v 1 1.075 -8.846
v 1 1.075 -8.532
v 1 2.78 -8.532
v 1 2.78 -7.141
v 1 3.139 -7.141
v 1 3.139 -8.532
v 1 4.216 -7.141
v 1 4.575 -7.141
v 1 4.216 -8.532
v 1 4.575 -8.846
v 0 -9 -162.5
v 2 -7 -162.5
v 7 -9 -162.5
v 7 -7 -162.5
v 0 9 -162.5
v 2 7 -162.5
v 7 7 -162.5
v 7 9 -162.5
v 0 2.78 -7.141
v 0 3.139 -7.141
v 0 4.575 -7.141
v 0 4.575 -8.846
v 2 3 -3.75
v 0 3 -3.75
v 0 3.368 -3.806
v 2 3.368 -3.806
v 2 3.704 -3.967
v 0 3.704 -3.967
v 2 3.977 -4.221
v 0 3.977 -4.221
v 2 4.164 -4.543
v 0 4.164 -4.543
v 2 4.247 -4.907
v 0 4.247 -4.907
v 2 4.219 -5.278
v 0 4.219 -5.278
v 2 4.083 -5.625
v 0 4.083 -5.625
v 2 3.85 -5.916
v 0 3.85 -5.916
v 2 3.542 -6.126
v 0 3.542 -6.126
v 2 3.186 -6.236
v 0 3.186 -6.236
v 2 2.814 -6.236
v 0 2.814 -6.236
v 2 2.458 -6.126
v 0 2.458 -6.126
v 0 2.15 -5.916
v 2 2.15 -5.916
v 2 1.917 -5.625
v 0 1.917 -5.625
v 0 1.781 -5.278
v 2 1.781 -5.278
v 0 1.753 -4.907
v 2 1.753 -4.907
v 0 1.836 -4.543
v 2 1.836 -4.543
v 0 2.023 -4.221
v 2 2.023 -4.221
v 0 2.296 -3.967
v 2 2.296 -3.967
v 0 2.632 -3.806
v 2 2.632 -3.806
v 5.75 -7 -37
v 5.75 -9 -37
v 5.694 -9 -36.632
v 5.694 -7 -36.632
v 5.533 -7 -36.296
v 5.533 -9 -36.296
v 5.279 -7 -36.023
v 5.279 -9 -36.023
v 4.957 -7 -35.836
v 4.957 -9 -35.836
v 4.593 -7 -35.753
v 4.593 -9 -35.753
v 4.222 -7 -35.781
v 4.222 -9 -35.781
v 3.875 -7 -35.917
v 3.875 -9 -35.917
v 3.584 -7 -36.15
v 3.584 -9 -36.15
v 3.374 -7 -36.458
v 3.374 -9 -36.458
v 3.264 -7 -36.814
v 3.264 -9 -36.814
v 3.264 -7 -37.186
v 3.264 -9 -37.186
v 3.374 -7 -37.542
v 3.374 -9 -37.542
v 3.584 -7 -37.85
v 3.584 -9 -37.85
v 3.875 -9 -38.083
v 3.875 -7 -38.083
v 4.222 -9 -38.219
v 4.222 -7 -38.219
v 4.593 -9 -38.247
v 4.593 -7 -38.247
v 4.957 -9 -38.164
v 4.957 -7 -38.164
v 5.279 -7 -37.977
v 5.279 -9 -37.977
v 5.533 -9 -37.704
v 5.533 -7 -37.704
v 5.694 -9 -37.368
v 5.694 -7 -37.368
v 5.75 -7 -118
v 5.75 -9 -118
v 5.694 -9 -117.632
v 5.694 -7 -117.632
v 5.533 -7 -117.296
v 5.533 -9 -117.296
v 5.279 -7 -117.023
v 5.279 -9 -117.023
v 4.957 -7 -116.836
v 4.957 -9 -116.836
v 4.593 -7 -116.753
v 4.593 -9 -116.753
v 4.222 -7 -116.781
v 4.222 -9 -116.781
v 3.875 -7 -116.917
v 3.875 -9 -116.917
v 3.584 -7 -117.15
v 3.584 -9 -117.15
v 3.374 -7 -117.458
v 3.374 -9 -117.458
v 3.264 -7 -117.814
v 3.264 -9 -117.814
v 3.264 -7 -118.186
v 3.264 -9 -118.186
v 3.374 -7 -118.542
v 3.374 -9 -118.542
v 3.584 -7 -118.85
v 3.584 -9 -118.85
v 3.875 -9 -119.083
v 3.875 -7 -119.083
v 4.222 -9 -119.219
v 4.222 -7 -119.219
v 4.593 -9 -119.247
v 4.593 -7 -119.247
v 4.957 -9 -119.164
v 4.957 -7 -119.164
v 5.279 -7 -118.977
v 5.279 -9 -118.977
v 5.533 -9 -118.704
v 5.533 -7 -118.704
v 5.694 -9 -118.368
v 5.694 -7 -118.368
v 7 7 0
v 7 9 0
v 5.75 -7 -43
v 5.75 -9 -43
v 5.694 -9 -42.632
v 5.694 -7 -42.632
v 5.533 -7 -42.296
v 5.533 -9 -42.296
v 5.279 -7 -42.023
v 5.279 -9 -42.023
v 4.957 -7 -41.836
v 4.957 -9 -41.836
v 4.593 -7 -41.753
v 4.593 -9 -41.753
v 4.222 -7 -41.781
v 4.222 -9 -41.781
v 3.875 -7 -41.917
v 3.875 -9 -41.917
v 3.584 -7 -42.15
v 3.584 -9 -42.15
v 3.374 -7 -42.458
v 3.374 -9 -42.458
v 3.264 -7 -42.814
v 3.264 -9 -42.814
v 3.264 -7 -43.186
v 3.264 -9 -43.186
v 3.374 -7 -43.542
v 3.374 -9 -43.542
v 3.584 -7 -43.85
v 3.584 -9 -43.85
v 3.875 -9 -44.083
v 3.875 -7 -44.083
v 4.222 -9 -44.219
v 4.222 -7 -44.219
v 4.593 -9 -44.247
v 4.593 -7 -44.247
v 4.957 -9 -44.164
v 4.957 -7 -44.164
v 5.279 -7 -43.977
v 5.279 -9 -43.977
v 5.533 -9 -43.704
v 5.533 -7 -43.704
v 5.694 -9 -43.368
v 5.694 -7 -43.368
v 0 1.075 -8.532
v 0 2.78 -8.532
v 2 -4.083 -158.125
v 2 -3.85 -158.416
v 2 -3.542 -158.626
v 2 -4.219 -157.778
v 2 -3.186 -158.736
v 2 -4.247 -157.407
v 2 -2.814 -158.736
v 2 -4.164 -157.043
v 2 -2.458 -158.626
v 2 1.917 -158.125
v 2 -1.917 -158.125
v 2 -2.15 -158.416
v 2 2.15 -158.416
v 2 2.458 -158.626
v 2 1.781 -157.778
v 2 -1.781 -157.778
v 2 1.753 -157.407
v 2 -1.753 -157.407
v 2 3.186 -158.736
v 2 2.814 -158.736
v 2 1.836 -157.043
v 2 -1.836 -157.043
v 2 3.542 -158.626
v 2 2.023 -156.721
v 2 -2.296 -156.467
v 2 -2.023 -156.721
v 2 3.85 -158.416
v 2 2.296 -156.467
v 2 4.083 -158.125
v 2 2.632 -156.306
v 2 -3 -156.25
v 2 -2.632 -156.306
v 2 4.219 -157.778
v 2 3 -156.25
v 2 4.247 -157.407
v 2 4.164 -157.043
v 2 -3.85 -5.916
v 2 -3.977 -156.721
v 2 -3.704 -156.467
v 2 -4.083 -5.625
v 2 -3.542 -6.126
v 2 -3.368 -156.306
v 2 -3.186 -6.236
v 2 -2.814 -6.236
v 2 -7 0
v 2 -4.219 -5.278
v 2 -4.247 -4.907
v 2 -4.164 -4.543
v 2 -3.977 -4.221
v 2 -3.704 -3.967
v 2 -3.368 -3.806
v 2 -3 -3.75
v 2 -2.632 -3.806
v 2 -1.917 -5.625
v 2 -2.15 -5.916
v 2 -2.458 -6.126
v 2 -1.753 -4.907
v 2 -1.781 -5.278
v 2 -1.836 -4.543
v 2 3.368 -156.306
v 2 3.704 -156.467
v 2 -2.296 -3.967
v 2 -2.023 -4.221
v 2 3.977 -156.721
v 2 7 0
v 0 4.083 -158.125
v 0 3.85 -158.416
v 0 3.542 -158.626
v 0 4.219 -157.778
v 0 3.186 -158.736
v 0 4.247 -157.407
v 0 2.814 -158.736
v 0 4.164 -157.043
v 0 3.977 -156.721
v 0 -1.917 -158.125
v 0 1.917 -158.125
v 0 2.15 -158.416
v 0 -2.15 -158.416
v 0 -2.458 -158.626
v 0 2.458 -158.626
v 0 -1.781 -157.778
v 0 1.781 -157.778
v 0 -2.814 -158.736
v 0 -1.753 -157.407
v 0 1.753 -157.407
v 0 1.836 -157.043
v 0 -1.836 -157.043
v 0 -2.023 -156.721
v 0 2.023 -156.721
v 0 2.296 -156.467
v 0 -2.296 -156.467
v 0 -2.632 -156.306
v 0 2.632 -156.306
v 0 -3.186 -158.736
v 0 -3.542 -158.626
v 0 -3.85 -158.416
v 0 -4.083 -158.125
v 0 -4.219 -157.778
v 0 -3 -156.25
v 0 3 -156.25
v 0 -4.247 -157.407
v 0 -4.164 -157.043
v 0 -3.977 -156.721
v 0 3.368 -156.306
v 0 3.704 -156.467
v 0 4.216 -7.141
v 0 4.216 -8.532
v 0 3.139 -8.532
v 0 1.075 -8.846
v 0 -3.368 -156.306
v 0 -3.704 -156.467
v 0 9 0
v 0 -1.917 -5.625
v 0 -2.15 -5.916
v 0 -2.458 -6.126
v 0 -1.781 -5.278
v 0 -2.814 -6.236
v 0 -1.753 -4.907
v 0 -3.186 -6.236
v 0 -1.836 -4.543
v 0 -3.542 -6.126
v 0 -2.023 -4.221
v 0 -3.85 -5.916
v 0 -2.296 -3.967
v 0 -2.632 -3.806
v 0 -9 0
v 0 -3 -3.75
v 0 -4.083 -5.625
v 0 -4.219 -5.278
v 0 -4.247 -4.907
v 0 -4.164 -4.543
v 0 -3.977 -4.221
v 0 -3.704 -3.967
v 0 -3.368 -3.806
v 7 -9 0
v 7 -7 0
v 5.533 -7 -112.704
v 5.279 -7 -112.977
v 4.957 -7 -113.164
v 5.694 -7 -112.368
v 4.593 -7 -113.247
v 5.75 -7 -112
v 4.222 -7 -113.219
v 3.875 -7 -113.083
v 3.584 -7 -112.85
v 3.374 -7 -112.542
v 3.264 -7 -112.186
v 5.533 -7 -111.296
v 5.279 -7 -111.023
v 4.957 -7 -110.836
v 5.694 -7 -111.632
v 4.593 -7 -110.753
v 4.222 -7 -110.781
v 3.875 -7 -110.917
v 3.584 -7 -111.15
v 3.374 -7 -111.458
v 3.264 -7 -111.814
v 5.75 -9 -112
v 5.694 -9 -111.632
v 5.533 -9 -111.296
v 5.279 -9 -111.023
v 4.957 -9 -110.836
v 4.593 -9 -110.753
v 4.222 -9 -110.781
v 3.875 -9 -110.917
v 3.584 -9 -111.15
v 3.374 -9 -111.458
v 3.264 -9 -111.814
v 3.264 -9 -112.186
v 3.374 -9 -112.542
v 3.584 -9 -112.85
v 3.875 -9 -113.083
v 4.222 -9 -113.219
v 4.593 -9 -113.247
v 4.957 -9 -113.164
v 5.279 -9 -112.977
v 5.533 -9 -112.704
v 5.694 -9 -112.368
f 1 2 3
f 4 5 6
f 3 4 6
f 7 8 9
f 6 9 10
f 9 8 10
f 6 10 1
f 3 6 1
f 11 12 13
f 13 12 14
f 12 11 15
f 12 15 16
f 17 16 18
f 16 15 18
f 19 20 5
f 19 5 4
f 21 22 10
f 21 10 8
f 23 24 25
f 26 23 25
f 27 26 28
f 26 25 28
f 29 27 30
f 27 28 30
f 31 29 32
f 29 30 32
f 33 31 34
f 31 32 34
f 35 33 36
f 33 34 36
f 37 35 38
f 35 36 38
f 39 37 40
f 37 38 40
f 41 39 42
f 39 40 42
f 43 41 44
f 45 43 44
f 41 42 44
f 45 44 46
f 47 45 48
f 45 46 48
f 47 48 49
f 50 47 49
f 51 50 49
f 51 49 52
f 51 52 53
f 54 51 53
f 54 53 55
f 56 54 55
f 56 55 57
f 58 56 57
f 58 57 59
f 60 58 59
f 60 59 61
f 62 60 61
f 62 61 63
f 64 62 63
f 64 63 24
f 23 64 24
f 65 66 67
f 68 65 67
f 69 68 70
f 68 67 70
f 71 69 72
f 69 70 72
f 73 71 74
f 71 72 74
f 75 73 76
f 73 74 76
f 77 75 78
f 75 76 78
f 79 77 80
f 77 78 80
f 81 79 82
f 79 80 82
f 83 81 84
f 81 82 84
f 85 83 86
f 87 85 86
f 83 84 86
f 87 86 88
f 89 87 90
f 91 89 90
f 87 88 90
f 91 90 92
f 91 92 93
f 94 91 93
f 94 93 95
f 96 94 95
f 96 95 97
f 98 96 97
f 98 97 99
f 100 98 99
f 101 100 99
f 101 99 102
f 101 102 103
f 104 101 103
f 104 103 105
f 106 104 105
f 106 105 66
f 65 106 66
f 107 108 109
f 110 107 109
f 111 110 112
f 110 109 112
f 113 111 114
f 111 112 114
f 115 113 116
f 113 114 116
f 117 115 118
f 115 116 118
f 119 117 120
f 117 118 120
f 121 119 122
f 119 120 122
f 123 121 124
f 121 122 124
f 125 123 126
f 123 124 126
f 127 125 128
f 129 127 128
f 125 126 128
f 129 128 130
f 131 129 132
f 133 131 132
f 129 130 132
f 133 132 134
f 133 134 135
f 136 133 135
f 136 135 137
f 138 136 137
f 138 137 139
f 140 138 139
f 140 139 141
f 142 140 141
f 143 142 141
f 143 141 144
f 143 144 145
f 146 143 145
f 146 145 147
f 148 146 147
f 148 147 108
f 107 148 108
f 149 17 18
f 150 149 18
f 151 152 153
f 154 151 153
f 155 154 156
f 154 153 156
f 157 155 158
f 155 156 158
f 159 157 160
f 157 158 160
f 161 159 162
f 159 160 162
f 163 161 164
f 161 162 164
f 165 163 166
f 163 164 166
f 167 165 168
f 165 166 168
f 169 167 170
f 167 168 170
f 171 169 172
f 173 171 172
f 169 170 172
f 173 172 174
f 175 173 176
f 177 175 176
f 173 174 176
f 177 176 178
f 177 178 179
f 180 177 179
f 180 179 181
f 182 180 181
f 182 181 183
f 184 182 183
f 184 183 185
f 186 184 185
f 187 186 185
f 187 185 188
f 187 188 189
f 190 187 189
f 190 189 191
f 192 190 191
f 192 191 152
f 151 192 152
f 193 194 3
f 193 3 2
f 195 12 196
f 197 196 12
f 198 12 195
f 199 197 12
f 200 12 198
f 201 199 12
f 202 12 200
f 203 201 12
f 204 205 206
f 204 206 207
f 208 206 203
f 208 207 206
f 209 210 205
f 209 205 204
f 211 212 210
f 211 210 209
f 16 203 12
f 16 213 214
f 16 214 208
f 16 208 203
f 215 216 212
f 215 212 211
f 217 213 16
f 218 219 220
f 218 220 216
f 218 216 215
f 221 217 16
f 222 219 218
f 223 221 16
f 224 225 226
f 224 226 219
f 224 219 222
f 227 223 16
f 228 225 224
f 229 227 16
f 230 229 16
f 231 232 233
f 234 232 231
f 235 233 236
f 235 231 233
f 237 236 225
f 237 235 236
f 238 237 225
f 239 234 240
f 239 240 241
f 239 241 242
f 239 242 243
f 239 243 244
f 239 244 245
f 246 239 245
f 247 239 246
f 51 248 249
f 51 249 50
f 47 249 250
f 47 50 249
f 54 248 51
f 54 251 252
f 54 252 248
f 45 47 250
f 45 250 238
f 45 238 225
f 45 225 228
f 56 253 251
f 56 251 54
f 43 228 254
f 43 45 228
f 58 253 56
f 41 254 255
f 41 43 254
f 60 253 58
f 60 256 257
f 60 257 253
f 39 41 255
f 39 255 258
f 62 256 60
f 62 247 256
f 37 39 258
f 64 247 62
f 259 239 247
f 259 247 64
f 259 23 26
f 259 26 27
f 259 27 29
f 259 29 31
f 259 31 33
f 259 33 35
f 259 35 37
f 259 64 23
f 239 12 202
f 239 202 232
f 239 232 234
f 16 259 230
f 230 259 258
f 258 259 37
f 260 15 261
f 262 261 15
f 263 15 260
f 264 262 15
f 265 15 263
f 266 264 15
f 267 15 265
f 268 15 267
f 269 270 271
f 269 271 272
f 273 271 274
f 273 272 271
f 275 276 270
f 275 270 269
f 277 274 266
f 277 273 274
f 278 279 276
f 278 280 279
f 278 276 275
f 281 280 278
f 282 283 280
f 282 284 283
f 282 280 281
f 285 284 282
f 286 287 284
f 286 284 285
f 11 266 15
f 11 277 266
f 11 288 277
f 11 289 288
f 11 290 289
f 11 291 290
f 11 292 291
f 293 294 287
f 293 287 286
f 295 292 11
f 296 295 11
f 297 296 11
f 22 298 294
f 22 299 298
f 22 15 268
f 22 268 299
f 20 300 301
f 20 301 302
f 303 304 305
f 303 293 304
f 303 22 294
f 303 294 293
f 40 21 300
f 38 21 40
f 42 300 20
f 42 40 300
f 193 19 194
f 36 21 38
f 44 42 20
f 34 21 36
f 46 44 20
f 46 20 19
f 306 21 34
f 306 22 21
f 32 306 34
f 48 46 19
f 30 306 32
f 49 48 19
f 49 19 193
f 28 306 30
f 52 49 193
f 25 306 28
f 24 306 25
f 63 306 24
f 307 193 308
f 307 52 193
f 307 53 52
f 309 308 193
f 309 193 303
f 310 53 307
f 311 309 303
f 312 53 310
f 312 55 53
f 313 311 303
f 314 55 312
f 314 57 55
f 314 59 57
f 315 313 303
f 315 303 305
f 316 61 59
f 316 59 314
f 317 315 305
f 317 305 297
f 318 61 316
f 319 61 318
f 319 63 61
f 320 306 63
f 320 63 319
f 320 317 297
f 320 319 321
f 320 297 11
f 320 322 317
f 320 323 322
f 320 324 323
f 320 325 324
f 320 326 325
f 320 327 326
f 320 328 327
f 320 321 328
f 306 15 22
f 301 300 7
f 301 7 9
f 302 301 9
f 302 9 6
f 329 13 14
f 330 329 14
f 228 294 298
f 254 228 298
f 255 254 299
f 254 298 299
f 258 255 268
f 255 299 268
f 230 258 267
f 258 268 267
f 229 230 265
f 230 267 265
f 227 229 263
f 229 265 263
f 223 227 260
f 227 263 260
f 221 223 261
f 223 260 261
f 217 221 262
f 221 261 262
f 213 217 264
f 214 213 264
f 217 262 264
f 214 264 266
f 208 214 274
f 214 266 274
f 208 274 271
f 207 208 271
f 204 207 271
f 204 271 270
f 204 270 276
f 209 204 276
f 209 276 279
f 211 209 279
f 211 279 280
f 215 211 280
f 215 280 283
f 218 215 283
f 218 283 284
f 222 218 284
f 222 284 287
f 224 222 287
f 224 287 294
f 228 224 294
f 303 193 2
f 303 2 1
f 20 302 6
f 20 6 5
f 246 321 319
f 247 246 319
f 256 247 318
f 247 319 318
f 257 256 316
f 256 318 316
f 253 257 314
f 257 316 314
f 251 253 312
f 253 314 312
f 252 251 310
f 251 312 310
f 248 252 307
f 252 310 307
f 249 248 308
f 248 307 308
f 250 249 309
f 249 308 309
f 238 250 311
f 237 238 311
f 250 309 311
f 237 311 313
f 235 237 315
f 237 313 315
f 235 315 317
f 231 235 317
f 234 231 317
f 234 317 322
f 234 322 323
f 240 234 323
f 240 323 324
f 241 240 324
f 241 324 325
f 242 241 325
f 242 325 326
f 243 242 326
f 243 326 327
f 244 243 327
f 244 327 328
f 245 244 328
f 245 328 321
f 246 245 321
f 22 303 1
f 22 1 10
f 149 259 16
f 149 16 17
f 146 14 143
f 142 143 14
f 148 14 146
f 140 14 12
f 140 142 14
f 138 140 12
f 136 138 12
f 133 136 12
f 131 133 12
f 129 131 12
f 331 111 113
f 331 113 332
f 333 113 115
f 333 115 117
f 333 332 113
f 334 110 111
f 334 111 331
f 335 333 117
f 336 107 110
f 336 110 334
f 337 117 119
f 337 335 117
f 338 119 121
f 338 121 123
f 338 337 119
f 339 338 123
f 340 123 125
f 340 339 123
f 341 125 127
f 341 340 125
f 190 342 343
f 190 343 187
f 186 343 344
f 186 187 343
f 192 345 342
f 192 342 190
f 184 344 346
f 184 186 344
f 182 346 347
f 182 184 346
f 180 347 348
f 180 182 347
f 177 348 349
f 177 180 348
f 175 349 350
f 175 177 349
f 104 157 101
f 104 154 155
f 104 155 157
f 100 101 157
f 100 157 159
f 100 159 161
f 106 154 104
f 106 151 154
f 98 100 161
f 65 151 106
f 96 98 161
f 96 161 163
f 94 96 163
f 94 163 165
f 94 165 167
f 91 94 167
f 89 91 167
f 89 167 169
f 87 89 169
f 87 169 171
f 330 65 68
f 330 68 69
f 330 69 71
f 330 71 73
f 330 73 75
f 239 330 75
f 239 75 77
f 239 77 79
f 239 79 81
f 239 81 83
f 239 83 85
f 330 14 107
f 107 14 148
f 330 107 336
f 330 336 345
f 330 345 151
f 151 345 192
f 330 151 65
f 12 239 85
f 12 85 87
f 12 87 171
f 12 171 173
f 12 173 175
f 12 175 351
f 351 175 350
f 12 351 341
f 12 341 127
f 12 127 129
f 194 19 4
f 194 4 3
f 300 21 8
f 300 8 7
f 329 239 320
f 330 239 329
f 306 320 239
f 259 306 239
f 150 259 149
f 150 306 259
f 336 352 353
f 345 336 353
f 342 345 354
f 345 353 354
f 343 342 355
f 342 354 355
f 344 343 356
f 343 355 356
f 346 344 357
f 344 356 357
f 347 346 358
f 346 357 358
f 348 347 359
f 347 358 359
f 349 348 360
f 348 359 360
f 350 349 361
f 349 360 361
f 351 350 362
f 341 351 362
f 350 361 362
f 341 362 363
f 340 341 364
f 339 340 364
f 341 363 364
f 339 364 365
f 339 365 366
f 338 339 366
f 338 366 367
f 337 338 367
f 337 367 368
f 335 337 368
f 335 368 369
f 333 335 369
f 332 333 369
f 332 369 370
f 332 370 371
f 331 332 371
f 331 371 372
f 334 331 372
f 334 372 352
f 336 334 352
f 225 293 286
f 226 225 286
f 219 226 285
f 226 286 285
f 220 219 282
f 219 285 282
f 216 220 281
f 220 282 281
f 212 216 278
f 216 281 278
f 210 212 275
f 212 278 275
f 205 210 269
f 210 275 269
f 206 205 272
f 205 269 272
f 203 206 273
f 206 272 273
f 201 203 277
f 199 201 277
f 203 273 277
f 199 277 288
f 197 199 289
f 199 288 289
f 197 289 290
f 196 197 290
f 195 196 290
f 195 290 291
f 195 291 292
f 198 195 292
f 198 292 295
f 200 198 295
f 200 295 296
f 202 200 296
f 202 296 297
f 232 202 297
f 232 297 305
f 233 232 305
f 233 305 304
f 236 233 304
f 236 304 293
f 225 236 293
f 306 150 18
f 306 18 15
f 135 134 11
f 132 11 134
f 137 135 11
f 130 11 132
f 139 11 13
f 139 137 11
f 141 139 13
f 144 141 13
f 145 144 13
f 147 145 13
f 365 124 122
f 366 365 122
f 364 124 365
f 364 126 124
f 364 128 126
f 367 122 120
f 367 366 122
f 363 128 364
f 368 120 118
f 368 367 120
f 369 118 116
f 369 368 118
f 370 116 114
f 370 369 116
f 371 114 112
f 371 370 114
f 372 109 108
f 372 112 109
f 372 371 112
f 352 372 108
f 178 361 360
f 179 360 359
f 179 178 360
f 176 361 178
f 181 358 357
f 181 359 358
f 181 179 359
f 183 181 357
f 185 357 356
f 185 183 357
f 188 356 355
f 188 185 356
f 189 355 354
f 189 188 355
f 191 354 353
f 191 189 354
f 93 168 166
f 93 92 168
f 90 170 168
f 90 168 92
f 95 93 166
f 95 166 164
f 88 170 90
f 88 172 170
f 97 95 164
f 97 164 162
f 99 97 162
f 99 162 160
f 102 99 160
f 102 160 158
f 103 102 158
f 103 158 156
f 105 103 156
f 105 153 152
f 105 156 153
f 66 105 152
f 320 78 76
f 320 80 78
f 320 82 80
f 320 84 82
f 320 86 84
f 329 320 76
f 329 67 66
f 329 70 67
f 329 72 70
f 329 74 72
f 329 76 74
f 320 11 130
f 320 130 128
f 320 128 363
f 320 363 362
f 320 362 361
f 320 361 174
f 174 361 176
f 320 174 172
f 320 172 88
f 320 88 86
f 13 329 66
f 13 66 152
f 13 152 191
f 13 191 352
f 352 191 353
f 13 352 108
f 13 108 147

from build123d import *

# Parameters (mm, degrees)
BOSS_EXTRUDE1_DEPTH = 162.5
SKETCH2_R           = 1.25
CUT_EXTRUDE1_DEPTH  = 8
CUT_EXTRUDE2_DEPTH  = 1
SKETCH4_R           = 1.25
CUT_EXTRUDE3_DEPTH  = 3


with BuildPart() as part:
    # Sketch1 → Boss-Extrude1 (new body)
    with BuildSketch(Plane.XY):
        Polygon((0, 9), (0, -9), (7, -9), (7, -7), (2, -7), (2, 7), (7, 7), (7, 9), align=None)
    extrude(amount=-BOSS_EXTRUDE1_DEPTH)

    # Sketch2 → Cut-Extrude1 (cut, through all)
    with BuildSketch(Plane.ZY):
        with Locations((-5, 3)):
            Circle(SKETCH2_R)
        with Locations((-5, -3)):
            Circle(SKETCH2_R)
        with Locations((-157.5, -3)):
            Circle(SKETCH2_R)
        with Locations((-157.5, 3)):
            Circle(SKETCH2_R)
    extrude(amount=-CUT_EXTRUDE1_DEPTH, mode=Mode.SUBTRACT)

    # Sketch3 → Cut-Extrude2 (cut)
    with BuildSketch(Plane.ZY):
        Polygon((-8.84619024, 4.575146227), (-7.141062035, 4.575146227), (-7.141062035, 4.216171868), (-8.532087676, 4.216171868), (-8.532087676, 3.139248791), (-7.141062035, 3.139248791), (-7.141062035, 2.780274432), (-8.532087676, 2.780274432), (-8.532087676, 1.075146227), (-8.84619024, 1.075146227), align=None)
    extrude(amount=-CUT_EXTRUDE2_DEPTH, mode=Mode.SUBTRACT)

    # Sketch4 → Cut-Extrude3 (cut)
    with BuildSketch(Plane.XZ.offset(9)):
        with Locations((4.5, -37)):
            Circle(SKETCH4_R)
        with Locations((4.5, -43)):
            Circle(SKETCH4_R)
        with Locations((4.5, -112)):
            Circle(SKETCH4_R)
        with Locations((4.5, -118)):
            Circle(SKETCH4_R)
    extrude(amount=-CUT_EXTRUDE3_DEPTH, mode=Mode.SUBTRACT)


solid = part.part
